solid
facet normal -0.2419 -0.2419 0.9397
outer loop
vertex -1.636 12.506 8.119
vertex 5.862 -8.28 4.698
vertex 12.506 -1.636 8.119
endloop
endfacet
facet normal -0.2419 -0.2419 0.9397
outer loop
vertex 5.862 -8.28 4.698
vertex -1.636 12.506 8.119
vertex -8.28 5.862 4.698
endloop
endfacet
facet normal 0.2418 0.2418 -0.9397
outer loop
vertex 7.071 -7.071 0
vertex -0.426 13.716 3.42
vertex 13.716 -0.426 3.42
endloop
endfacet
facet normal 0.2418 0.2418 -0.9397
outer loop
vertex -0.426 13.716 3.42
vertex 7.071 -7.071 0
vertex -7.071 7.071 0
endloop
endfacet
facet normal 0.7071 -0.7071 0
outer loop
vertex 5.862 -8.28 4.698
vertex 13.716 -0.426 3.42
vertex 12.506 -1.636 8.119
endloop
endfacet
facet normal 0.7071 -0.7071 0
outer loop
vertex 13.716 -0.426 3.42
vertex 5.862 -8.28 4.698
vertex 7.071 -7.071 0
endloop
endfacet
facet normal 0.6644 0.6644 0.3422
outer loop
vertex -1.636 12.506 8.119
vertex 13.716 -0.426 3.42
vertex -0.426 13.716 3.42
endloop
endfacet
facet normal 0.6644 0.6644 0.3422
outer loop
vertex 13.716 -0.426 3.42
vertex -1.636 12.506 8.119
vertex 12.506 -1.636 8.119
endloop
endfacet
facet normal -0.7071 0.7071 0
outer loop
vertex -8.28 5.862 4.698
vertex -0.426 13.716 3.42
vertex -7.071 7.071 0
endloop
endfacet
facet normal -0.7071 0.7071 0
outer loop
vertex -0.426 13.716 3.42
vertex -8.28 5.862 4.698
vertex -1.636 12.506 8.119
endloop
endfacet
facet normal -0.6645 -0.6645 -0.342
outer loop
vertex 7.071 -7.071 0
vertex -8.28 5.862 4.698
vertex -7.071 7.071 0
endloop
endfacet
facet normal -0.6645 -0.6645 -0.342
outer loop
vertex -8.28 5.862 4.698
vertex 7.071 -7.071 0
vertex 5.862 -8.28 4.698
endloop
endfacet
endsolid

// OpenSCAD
let($fa=2.000000, $fn=0, $fs=0.150000) rotate(a=[0.000000, -20.000000, 45.000000]) translate(v=[0.000000, -10.000000, 0.000000]) cube(size=[10.000000, 20.000000, 5.000000]);
